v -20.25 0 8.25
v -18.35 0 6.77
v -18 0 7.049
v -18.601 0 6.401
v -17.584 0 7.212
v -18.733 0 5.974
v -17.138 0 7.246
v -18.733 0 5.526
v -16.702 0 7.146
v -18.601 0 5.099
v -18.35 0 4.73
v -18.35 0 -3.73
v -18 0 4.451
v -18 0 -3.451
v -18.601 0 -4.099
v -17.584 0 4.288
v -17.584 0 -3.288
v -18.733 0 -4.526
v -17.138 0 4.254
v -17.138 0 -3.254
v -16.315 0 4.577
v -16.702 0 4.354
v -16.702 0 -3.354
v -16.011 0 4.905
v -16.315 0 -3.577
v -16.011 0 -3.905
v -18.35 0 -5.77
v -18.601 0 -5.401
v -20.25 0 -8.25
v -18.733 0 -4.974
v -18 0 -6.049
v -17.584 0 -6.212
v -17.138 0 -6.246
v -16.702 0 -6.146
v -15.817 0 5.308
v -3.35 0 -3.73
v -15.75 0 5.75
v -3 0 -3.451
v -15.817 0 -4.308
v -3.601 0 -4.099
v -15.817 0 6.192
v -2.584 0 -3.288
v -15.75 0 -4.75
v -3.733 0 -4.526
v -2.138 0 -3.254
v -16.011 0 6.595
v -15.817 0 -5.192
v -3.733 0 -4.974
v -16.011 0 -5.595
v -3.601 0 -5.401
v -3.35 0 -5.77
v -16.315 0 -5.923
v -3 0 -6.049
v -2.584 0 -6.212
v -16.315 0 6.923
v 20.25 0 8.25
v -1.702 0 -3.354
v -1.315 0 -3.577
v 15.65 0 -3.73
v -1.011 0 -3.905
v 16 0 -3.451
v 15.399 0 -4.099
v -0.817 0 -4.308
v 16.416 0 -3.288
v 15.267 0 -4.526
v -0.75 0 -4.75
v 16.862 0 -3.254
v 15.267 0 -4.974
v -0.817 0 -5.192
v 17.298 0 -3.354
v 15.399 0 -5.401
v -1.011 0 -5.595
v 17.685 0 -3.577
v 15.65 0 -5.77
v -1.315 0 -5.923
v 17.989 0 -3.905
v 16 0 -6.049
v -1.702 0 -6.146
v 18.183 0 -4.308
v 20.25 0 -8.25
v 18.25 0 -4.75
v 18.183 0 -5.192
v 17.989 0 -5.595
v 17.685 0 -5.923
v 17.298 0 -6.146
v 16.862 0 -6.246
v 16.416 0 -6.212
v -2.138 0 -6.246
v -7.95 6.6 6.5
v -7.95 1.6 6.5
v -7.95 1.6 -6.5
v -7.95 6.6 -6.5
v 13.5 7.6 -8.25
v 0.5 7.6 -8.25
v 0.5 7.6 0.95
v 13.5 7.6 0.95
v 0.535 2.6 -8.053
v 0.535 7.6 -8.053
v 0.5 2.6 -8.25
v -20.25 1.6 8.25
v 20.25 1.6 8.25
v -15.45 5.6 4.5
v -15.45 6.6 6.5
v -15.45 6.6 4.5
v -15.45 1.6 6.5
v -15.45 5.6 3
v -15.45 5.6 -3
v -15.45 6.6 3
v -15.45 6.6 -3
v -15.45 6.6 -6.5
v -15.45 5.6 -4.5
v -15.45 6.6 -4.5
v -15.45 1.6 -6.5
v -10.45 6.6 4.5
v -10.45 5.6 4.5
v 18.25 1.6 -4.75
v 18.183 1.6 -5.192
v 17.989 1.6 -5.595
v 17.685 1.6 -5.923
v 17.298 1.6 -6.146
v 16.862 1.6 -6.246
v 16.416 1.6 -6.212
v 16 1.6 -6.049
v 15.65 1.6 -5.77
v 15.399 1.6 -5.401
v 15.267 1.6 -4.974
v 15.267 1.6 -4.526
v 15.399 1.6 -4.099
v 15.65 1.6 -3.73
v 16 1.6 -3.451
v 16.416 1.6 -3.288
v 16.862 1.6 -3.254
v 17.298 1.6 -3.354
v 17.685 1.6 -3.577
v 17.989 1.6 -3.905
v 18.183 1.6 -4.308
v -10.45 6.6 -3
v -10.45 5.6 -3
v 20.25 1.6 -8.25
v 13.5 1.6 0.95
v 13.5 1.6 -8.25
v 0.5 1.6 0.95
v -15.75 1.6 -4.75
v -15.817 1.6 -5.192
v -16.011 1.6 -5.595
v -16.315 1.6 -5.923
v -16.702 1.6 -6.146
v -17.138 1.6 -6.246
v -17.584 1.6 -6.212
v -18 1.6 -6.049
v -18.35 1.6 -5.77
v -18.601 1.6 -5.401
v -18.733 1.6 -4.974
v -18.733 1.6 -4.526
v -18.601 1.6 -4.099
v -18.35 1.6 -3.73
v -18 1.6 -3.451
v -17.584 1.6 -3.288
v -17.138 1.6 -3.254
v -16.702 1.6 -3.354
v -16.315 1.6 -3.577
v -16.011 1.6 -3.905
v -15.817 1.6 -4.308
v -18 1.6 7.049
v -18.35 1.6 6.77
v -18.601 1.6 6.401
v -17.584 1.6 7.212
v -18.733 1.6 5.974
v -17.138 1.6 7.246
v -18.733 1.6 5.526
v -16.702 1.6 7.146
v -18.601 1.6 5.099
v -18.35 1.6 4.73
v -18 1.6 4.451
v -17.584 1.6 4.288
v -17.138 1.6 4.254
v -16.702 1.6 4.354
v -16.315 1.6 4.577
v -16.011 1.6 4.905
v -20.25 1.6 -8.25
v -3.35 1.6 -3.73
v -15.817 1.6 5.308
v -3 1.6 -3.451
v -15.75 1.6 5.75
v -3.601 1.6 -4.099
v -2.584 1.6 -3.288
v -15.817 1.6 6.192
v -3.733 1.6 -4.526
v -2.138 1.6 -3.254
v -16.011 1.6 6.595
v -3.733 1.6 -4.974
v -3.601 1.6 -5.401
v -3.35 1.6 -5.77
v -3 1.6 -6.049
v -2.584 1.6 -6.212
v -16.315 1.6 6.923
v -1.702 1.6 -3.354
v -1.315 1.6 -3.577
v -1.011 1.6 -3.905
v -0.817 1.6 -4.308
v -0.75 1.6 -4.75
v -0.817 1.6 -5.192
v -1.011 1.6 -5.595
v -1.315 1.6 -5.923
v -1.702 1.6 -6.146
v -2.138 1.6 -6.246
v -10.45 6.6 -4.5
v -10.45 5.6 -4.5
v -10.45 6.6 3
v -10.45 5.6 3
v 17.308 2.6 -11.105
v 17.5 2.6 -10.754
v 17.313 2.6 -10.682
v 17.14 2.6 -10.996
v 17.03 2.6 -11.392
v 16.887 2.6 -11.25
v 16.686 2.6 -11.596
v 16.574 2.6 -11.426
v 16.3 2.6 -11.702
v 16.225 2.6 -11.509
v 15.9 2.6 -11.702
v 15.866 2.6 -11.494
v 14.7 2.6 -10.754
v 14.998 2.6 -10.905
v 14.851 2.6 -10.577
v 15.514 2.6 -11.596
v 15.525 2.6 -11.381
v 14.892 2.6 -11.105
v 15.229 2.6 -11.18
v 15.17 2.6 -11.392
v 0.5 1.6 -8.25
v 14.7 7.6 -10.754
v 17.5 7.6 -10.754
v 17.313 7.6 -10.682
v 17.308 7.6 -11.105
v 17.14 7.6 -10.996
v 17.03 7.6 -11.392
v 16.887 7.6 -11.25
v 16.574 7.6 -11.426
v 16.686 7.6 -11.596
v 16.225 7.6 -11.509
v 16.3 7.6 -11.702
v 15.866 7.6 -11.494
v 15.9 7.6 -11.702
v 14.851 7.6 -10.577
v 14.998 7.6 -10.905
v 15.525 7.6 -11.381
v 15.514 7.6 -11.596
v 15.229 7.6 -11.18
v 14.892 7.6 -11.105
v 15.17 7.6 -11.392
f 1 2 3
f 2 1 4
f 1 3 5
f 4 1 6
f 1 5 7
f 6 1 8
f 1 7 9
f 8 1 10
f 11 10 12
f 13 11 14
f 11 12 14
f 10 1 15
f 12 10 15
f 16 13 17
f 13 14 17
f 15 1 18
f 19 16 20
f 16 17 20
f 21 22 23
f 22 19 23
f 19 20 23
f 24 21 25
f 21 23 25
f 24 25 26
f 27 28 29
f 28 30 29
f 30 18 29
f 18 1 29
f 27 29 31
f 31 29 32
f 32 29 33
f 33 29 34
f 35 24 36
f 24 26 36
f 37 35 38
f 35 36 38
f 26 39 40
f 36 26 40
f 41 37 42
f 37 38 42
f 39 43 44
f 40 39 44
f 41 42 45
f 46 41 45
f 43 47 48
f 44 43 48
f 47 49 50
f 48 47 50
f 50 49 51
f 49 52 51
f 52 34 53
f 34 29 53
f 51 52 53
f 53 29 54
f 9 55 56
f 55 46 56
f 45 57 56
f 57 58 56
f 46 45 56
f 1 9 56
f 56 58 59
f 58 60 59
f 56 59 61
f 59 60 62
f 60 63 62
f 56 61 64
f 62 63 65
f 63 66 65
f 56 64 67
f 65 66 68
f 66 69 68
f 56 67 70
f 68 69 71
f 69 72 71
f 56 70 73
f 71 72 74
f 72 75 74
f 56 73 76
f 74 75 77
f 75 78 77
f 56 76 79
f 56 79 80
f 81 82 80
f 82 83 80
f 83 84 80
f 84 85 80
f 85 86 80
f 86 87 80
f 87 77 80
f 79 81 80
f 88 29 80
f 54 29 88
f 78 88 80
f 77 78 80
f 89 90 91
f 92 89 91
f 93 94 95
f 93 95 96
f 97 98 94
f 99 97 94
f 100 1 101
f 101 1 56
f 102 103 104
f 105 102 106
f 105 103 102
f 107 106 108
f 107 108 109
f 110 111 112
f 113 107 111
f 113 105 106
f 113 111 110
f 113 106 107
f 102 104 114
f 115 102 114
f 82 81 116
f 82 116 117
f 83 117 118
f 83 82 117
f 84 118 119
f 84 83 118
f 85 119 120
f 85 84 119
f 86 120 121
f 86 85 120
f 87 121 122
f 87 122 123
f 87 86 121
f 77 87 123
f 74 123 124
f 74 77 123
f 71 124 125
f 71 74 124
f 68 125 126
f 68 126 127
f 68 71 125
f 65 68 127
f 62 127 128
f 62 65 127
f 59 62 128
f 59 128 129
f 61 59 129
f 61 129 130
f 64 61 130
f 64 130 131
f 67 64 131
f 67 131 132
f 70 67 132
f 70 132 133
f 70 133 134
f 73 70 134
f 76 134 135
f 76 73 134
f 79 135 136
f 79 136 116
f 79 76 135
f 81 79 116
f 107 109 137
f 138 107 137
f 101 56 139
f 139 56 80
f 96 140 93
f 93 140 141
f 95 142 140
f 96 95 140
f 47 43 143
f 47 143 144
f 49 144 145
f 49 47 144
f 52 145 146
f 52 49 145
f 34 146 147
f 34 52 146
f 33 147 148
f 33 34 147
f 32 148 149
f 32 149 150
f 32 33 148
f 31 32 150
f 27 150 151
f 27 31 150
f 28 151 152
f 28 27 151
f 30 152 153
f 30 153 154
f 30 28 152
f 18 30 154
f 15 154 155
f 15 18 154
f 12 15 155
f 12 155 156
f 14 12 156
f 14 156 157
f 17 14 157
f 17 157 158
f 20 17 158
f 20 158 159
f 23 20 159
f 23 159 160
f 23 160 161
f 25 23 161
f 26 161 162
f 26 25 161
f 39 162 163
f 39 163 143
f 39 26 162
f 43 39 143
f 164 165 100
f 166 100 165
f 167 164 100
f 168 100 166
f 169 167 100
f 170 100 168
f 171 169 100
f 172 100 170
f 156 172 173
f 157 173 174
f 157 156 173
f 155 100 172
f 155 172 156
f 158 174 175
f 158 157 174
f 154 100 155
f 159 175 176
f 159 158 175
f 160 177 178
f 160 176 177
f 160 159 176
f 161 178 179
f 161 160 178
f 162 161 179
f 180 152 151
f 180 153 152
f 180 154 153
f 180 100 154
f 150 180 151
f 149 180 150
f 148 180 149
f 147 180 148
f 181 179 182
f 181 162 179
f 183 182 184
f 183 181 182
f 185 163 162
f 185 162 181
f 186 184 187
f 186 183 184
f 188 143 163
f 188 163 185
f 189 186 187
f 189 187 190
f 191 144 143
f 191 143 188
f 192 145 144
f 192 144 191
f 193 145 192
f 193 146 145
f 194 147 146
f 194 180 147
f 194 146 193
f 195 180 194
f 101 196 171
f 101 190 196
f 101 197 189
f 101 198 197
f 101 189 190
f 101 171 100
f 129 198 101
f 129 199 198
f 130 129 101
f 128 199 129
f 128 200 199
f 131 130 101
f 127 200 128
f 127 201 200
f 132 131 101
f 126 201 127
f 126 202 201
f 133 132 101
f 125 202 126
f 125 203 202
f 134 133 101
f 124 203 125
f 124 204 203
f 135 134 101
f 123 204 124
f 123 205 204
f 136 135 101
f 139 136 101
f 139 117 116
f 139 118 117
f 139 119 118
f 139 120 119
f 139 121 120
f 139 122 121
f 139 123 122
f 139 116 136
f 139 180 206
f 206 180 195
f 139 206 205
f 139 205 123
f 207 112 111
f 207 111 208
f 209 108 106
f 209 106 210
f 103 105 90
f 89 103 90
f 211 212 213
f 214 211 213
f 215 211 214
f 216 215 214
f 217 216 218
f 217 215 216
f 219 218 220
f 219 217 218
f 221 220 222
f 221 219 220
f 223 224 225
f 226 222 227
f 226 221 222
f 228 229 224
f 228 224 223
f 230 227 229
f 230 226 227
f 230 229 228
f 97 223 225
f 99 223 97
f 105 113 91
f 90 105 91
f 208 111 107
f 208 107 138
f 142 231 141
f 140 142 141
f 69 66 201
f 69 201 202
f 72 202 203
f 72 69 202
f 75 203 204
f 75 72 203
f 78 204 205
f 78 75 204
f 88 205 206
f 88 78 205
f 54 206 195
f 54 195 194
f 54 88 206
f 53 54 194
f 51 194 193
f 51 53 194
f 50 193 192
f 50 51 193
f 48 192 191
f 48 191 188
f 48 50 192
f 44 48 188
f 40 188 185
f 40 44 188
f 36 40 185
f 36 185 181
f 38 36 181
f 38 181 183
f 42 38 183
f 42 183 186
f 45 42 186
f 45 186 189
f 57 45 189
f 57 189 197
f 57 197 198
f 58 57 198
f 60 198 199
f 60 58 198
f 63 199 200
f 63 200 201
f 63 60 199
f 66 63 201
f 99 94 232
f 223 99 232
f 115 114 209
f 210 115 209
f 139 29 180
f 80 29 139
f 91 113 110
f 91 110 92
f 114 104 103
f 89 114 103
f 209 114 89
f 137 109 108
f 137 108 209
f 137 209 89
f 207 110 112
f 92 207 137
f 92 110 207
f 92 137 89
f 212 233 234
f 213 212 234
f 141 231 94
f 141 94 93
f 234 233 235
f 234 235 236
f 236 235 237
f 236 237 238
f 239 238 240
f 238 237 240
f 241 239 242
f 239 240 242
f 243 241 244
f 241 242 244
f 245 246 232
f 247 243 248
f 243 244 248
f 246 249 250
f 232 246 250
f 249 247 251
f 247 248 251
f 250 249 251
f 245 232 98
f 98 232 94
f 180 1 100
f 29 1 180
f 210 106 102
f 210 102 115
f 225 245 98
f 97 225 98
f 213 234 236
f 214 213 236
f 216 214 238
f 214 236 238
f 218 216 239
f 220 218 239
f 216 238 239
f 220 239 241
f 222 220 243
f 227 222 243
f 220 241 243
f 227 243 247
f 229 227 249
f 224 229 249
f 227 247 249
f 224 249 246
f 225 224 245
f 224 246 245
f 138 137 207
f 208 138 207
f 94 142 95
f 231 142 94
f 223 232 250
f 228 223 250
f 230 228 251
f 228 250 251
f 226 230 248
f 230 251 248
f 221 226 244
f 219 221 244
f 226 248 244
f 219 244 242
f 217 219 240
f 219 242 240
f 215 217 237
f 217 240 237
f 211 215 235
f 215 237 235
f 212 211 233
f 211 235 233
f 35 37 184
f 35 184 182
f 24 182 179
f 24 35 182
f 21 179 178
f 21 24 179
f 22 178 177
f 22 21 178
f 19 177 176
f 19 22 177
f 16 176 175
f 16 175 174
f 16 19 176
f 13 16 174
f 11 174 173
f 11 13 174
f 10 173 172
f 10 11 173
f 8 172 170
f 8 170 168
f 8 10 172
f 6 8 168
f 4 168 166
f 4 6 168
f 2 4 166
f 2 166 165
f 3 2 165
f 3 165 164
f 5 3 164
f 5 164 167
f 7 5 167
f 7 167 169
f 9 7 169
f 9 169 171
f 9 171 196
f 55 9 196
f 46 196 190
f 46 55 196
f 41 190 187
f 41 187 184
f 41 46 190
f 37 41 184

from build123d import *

# Parameters (mm, degrees)
SKETCH1_W           = 40.5
SKETCH1_H           = 16.5
SKETCH1_R           = 1.5
BOSS_EXTRUDE1_DEPTH = 1.6
SKETCH2_W           = 13
SKETCH2_H           = 9.2
BOSS_EXTRUDE2_DEPTH = 6
SKETCH3_W           = 7.5
SKETCH3_H           = 13
BOSS_EXTRUDE3_DEPTH = 5
SKETCH4_W           = 5
SKETCH4_H           = 1.5
CUT_EXTRUDE1_DEPTH  = 1
EXTRUDE_THIN1_DEPTH = 5


with BuildPart() as part:
    # Sketch1 → Boss-Extrude1 (new body)
    with BuildSketch(Plane(origin=(0, 0, 0), x_dir=(1, 0, 0), z_dir=(0, 1, 0))):
        Rectangle(SKETCH1_W, SKETCH1_H)
        with Locations((-17.25, -5.75)):
            Circle(SKETCH1_R, mode=Mode.SUBTRACT)
        with Locations((-17.25, 4.75)):
            Circle(SKETCH1_R, mode=Mode.SUBTRACT)
        with Locations((-2.25, 4.75)):
            Circle(SKETCH1_R, mode=Mode.SUBTRACT)
        with Locations((16.75, 4.75)):
            Circle(SKETCH1_R, mode=Mode.SUBTRACT)
    extrude(amount=BOSS_EXTRUDE1_DEPTH)


with BuildPart() as body_2:
    # Sketch2 → Boss-Extrude2 (new body)
    with BuildSketch(Plane(origin=(0, 1.6, 0), x_dir=(1, 0, 0), z_dir=(0, 1, 0))):
        with Locations((7, 3.65)):
            Rectangle(SKETCH2_W, SKETCH2_H)
    extrude(amount=BOSS_EXTRUDE2_DEPTH)


with BuildPart() as body_3:
    # Sketch3 → Boss-Extrude3 (new body)
    with BuildSketch(Plane(origin=(0, 1.6, 0), x_dir=(1, 0, 0), z_dir=(0, 1, 0))):
        with Locations((-11.7, 0)):
            Rectangle(SKETCH3_W, SKETCH3_H)
    extrude(amount=BOSS_EXTRUDE3_DEPTH)

    # Sketch4 → Cut-Extrude1 (cut)
    with BuildSketch(Plane(origin=(0, 6.6, 0), x_dir=(1, 0, 0), z_dir=(0, 1, 0))):
        with Locations((-12.95, 3.75)):
            Rectangle(SKETCH4_W, SKETCH4_H)
        with Locations((-12.95, -3.75)):
            Rectangle(SKETCH4_W, SKETCH4_H)
    extrude(amount=-CUT_EXTRUDE1_DEPTH, mode=Mode.SUBTRACT)


with BuildPart() as body_4:
    # Sketch5 → Extrude-Thin1 (new body)
    with BuildSketch(Plane(origin=(0, 7.6, 0), x_dir=(1, 0, 0), z_dir=(0, 1, 0))):
        with BuildLine():
            Line((0.5, 8.25), (14.7, 10.753843126))
            ThreePointArc((14.7, 10.753843126), (16.1, 11.715326645), (17.5, 10.753843126))
            Line((17.5, 10.753843126), (17.313333333, 10.682040929))
            ThreePointArc((17.313333333, 10.682040929), (16.044827604, 11.514155351), (14.851458229, 10.577463976))
            Line((14.851458229, 10.577463976), (0.534729636, 8.053038449))
            Line((0.534729636, 8.053038449), (0.5, 8.25))
        make_face()
    extrude(amount=-EXTRUDE_THIN1_DEPTH)


solid = Compound([part.part, body_2.part, body_3.part, body_4.part])
